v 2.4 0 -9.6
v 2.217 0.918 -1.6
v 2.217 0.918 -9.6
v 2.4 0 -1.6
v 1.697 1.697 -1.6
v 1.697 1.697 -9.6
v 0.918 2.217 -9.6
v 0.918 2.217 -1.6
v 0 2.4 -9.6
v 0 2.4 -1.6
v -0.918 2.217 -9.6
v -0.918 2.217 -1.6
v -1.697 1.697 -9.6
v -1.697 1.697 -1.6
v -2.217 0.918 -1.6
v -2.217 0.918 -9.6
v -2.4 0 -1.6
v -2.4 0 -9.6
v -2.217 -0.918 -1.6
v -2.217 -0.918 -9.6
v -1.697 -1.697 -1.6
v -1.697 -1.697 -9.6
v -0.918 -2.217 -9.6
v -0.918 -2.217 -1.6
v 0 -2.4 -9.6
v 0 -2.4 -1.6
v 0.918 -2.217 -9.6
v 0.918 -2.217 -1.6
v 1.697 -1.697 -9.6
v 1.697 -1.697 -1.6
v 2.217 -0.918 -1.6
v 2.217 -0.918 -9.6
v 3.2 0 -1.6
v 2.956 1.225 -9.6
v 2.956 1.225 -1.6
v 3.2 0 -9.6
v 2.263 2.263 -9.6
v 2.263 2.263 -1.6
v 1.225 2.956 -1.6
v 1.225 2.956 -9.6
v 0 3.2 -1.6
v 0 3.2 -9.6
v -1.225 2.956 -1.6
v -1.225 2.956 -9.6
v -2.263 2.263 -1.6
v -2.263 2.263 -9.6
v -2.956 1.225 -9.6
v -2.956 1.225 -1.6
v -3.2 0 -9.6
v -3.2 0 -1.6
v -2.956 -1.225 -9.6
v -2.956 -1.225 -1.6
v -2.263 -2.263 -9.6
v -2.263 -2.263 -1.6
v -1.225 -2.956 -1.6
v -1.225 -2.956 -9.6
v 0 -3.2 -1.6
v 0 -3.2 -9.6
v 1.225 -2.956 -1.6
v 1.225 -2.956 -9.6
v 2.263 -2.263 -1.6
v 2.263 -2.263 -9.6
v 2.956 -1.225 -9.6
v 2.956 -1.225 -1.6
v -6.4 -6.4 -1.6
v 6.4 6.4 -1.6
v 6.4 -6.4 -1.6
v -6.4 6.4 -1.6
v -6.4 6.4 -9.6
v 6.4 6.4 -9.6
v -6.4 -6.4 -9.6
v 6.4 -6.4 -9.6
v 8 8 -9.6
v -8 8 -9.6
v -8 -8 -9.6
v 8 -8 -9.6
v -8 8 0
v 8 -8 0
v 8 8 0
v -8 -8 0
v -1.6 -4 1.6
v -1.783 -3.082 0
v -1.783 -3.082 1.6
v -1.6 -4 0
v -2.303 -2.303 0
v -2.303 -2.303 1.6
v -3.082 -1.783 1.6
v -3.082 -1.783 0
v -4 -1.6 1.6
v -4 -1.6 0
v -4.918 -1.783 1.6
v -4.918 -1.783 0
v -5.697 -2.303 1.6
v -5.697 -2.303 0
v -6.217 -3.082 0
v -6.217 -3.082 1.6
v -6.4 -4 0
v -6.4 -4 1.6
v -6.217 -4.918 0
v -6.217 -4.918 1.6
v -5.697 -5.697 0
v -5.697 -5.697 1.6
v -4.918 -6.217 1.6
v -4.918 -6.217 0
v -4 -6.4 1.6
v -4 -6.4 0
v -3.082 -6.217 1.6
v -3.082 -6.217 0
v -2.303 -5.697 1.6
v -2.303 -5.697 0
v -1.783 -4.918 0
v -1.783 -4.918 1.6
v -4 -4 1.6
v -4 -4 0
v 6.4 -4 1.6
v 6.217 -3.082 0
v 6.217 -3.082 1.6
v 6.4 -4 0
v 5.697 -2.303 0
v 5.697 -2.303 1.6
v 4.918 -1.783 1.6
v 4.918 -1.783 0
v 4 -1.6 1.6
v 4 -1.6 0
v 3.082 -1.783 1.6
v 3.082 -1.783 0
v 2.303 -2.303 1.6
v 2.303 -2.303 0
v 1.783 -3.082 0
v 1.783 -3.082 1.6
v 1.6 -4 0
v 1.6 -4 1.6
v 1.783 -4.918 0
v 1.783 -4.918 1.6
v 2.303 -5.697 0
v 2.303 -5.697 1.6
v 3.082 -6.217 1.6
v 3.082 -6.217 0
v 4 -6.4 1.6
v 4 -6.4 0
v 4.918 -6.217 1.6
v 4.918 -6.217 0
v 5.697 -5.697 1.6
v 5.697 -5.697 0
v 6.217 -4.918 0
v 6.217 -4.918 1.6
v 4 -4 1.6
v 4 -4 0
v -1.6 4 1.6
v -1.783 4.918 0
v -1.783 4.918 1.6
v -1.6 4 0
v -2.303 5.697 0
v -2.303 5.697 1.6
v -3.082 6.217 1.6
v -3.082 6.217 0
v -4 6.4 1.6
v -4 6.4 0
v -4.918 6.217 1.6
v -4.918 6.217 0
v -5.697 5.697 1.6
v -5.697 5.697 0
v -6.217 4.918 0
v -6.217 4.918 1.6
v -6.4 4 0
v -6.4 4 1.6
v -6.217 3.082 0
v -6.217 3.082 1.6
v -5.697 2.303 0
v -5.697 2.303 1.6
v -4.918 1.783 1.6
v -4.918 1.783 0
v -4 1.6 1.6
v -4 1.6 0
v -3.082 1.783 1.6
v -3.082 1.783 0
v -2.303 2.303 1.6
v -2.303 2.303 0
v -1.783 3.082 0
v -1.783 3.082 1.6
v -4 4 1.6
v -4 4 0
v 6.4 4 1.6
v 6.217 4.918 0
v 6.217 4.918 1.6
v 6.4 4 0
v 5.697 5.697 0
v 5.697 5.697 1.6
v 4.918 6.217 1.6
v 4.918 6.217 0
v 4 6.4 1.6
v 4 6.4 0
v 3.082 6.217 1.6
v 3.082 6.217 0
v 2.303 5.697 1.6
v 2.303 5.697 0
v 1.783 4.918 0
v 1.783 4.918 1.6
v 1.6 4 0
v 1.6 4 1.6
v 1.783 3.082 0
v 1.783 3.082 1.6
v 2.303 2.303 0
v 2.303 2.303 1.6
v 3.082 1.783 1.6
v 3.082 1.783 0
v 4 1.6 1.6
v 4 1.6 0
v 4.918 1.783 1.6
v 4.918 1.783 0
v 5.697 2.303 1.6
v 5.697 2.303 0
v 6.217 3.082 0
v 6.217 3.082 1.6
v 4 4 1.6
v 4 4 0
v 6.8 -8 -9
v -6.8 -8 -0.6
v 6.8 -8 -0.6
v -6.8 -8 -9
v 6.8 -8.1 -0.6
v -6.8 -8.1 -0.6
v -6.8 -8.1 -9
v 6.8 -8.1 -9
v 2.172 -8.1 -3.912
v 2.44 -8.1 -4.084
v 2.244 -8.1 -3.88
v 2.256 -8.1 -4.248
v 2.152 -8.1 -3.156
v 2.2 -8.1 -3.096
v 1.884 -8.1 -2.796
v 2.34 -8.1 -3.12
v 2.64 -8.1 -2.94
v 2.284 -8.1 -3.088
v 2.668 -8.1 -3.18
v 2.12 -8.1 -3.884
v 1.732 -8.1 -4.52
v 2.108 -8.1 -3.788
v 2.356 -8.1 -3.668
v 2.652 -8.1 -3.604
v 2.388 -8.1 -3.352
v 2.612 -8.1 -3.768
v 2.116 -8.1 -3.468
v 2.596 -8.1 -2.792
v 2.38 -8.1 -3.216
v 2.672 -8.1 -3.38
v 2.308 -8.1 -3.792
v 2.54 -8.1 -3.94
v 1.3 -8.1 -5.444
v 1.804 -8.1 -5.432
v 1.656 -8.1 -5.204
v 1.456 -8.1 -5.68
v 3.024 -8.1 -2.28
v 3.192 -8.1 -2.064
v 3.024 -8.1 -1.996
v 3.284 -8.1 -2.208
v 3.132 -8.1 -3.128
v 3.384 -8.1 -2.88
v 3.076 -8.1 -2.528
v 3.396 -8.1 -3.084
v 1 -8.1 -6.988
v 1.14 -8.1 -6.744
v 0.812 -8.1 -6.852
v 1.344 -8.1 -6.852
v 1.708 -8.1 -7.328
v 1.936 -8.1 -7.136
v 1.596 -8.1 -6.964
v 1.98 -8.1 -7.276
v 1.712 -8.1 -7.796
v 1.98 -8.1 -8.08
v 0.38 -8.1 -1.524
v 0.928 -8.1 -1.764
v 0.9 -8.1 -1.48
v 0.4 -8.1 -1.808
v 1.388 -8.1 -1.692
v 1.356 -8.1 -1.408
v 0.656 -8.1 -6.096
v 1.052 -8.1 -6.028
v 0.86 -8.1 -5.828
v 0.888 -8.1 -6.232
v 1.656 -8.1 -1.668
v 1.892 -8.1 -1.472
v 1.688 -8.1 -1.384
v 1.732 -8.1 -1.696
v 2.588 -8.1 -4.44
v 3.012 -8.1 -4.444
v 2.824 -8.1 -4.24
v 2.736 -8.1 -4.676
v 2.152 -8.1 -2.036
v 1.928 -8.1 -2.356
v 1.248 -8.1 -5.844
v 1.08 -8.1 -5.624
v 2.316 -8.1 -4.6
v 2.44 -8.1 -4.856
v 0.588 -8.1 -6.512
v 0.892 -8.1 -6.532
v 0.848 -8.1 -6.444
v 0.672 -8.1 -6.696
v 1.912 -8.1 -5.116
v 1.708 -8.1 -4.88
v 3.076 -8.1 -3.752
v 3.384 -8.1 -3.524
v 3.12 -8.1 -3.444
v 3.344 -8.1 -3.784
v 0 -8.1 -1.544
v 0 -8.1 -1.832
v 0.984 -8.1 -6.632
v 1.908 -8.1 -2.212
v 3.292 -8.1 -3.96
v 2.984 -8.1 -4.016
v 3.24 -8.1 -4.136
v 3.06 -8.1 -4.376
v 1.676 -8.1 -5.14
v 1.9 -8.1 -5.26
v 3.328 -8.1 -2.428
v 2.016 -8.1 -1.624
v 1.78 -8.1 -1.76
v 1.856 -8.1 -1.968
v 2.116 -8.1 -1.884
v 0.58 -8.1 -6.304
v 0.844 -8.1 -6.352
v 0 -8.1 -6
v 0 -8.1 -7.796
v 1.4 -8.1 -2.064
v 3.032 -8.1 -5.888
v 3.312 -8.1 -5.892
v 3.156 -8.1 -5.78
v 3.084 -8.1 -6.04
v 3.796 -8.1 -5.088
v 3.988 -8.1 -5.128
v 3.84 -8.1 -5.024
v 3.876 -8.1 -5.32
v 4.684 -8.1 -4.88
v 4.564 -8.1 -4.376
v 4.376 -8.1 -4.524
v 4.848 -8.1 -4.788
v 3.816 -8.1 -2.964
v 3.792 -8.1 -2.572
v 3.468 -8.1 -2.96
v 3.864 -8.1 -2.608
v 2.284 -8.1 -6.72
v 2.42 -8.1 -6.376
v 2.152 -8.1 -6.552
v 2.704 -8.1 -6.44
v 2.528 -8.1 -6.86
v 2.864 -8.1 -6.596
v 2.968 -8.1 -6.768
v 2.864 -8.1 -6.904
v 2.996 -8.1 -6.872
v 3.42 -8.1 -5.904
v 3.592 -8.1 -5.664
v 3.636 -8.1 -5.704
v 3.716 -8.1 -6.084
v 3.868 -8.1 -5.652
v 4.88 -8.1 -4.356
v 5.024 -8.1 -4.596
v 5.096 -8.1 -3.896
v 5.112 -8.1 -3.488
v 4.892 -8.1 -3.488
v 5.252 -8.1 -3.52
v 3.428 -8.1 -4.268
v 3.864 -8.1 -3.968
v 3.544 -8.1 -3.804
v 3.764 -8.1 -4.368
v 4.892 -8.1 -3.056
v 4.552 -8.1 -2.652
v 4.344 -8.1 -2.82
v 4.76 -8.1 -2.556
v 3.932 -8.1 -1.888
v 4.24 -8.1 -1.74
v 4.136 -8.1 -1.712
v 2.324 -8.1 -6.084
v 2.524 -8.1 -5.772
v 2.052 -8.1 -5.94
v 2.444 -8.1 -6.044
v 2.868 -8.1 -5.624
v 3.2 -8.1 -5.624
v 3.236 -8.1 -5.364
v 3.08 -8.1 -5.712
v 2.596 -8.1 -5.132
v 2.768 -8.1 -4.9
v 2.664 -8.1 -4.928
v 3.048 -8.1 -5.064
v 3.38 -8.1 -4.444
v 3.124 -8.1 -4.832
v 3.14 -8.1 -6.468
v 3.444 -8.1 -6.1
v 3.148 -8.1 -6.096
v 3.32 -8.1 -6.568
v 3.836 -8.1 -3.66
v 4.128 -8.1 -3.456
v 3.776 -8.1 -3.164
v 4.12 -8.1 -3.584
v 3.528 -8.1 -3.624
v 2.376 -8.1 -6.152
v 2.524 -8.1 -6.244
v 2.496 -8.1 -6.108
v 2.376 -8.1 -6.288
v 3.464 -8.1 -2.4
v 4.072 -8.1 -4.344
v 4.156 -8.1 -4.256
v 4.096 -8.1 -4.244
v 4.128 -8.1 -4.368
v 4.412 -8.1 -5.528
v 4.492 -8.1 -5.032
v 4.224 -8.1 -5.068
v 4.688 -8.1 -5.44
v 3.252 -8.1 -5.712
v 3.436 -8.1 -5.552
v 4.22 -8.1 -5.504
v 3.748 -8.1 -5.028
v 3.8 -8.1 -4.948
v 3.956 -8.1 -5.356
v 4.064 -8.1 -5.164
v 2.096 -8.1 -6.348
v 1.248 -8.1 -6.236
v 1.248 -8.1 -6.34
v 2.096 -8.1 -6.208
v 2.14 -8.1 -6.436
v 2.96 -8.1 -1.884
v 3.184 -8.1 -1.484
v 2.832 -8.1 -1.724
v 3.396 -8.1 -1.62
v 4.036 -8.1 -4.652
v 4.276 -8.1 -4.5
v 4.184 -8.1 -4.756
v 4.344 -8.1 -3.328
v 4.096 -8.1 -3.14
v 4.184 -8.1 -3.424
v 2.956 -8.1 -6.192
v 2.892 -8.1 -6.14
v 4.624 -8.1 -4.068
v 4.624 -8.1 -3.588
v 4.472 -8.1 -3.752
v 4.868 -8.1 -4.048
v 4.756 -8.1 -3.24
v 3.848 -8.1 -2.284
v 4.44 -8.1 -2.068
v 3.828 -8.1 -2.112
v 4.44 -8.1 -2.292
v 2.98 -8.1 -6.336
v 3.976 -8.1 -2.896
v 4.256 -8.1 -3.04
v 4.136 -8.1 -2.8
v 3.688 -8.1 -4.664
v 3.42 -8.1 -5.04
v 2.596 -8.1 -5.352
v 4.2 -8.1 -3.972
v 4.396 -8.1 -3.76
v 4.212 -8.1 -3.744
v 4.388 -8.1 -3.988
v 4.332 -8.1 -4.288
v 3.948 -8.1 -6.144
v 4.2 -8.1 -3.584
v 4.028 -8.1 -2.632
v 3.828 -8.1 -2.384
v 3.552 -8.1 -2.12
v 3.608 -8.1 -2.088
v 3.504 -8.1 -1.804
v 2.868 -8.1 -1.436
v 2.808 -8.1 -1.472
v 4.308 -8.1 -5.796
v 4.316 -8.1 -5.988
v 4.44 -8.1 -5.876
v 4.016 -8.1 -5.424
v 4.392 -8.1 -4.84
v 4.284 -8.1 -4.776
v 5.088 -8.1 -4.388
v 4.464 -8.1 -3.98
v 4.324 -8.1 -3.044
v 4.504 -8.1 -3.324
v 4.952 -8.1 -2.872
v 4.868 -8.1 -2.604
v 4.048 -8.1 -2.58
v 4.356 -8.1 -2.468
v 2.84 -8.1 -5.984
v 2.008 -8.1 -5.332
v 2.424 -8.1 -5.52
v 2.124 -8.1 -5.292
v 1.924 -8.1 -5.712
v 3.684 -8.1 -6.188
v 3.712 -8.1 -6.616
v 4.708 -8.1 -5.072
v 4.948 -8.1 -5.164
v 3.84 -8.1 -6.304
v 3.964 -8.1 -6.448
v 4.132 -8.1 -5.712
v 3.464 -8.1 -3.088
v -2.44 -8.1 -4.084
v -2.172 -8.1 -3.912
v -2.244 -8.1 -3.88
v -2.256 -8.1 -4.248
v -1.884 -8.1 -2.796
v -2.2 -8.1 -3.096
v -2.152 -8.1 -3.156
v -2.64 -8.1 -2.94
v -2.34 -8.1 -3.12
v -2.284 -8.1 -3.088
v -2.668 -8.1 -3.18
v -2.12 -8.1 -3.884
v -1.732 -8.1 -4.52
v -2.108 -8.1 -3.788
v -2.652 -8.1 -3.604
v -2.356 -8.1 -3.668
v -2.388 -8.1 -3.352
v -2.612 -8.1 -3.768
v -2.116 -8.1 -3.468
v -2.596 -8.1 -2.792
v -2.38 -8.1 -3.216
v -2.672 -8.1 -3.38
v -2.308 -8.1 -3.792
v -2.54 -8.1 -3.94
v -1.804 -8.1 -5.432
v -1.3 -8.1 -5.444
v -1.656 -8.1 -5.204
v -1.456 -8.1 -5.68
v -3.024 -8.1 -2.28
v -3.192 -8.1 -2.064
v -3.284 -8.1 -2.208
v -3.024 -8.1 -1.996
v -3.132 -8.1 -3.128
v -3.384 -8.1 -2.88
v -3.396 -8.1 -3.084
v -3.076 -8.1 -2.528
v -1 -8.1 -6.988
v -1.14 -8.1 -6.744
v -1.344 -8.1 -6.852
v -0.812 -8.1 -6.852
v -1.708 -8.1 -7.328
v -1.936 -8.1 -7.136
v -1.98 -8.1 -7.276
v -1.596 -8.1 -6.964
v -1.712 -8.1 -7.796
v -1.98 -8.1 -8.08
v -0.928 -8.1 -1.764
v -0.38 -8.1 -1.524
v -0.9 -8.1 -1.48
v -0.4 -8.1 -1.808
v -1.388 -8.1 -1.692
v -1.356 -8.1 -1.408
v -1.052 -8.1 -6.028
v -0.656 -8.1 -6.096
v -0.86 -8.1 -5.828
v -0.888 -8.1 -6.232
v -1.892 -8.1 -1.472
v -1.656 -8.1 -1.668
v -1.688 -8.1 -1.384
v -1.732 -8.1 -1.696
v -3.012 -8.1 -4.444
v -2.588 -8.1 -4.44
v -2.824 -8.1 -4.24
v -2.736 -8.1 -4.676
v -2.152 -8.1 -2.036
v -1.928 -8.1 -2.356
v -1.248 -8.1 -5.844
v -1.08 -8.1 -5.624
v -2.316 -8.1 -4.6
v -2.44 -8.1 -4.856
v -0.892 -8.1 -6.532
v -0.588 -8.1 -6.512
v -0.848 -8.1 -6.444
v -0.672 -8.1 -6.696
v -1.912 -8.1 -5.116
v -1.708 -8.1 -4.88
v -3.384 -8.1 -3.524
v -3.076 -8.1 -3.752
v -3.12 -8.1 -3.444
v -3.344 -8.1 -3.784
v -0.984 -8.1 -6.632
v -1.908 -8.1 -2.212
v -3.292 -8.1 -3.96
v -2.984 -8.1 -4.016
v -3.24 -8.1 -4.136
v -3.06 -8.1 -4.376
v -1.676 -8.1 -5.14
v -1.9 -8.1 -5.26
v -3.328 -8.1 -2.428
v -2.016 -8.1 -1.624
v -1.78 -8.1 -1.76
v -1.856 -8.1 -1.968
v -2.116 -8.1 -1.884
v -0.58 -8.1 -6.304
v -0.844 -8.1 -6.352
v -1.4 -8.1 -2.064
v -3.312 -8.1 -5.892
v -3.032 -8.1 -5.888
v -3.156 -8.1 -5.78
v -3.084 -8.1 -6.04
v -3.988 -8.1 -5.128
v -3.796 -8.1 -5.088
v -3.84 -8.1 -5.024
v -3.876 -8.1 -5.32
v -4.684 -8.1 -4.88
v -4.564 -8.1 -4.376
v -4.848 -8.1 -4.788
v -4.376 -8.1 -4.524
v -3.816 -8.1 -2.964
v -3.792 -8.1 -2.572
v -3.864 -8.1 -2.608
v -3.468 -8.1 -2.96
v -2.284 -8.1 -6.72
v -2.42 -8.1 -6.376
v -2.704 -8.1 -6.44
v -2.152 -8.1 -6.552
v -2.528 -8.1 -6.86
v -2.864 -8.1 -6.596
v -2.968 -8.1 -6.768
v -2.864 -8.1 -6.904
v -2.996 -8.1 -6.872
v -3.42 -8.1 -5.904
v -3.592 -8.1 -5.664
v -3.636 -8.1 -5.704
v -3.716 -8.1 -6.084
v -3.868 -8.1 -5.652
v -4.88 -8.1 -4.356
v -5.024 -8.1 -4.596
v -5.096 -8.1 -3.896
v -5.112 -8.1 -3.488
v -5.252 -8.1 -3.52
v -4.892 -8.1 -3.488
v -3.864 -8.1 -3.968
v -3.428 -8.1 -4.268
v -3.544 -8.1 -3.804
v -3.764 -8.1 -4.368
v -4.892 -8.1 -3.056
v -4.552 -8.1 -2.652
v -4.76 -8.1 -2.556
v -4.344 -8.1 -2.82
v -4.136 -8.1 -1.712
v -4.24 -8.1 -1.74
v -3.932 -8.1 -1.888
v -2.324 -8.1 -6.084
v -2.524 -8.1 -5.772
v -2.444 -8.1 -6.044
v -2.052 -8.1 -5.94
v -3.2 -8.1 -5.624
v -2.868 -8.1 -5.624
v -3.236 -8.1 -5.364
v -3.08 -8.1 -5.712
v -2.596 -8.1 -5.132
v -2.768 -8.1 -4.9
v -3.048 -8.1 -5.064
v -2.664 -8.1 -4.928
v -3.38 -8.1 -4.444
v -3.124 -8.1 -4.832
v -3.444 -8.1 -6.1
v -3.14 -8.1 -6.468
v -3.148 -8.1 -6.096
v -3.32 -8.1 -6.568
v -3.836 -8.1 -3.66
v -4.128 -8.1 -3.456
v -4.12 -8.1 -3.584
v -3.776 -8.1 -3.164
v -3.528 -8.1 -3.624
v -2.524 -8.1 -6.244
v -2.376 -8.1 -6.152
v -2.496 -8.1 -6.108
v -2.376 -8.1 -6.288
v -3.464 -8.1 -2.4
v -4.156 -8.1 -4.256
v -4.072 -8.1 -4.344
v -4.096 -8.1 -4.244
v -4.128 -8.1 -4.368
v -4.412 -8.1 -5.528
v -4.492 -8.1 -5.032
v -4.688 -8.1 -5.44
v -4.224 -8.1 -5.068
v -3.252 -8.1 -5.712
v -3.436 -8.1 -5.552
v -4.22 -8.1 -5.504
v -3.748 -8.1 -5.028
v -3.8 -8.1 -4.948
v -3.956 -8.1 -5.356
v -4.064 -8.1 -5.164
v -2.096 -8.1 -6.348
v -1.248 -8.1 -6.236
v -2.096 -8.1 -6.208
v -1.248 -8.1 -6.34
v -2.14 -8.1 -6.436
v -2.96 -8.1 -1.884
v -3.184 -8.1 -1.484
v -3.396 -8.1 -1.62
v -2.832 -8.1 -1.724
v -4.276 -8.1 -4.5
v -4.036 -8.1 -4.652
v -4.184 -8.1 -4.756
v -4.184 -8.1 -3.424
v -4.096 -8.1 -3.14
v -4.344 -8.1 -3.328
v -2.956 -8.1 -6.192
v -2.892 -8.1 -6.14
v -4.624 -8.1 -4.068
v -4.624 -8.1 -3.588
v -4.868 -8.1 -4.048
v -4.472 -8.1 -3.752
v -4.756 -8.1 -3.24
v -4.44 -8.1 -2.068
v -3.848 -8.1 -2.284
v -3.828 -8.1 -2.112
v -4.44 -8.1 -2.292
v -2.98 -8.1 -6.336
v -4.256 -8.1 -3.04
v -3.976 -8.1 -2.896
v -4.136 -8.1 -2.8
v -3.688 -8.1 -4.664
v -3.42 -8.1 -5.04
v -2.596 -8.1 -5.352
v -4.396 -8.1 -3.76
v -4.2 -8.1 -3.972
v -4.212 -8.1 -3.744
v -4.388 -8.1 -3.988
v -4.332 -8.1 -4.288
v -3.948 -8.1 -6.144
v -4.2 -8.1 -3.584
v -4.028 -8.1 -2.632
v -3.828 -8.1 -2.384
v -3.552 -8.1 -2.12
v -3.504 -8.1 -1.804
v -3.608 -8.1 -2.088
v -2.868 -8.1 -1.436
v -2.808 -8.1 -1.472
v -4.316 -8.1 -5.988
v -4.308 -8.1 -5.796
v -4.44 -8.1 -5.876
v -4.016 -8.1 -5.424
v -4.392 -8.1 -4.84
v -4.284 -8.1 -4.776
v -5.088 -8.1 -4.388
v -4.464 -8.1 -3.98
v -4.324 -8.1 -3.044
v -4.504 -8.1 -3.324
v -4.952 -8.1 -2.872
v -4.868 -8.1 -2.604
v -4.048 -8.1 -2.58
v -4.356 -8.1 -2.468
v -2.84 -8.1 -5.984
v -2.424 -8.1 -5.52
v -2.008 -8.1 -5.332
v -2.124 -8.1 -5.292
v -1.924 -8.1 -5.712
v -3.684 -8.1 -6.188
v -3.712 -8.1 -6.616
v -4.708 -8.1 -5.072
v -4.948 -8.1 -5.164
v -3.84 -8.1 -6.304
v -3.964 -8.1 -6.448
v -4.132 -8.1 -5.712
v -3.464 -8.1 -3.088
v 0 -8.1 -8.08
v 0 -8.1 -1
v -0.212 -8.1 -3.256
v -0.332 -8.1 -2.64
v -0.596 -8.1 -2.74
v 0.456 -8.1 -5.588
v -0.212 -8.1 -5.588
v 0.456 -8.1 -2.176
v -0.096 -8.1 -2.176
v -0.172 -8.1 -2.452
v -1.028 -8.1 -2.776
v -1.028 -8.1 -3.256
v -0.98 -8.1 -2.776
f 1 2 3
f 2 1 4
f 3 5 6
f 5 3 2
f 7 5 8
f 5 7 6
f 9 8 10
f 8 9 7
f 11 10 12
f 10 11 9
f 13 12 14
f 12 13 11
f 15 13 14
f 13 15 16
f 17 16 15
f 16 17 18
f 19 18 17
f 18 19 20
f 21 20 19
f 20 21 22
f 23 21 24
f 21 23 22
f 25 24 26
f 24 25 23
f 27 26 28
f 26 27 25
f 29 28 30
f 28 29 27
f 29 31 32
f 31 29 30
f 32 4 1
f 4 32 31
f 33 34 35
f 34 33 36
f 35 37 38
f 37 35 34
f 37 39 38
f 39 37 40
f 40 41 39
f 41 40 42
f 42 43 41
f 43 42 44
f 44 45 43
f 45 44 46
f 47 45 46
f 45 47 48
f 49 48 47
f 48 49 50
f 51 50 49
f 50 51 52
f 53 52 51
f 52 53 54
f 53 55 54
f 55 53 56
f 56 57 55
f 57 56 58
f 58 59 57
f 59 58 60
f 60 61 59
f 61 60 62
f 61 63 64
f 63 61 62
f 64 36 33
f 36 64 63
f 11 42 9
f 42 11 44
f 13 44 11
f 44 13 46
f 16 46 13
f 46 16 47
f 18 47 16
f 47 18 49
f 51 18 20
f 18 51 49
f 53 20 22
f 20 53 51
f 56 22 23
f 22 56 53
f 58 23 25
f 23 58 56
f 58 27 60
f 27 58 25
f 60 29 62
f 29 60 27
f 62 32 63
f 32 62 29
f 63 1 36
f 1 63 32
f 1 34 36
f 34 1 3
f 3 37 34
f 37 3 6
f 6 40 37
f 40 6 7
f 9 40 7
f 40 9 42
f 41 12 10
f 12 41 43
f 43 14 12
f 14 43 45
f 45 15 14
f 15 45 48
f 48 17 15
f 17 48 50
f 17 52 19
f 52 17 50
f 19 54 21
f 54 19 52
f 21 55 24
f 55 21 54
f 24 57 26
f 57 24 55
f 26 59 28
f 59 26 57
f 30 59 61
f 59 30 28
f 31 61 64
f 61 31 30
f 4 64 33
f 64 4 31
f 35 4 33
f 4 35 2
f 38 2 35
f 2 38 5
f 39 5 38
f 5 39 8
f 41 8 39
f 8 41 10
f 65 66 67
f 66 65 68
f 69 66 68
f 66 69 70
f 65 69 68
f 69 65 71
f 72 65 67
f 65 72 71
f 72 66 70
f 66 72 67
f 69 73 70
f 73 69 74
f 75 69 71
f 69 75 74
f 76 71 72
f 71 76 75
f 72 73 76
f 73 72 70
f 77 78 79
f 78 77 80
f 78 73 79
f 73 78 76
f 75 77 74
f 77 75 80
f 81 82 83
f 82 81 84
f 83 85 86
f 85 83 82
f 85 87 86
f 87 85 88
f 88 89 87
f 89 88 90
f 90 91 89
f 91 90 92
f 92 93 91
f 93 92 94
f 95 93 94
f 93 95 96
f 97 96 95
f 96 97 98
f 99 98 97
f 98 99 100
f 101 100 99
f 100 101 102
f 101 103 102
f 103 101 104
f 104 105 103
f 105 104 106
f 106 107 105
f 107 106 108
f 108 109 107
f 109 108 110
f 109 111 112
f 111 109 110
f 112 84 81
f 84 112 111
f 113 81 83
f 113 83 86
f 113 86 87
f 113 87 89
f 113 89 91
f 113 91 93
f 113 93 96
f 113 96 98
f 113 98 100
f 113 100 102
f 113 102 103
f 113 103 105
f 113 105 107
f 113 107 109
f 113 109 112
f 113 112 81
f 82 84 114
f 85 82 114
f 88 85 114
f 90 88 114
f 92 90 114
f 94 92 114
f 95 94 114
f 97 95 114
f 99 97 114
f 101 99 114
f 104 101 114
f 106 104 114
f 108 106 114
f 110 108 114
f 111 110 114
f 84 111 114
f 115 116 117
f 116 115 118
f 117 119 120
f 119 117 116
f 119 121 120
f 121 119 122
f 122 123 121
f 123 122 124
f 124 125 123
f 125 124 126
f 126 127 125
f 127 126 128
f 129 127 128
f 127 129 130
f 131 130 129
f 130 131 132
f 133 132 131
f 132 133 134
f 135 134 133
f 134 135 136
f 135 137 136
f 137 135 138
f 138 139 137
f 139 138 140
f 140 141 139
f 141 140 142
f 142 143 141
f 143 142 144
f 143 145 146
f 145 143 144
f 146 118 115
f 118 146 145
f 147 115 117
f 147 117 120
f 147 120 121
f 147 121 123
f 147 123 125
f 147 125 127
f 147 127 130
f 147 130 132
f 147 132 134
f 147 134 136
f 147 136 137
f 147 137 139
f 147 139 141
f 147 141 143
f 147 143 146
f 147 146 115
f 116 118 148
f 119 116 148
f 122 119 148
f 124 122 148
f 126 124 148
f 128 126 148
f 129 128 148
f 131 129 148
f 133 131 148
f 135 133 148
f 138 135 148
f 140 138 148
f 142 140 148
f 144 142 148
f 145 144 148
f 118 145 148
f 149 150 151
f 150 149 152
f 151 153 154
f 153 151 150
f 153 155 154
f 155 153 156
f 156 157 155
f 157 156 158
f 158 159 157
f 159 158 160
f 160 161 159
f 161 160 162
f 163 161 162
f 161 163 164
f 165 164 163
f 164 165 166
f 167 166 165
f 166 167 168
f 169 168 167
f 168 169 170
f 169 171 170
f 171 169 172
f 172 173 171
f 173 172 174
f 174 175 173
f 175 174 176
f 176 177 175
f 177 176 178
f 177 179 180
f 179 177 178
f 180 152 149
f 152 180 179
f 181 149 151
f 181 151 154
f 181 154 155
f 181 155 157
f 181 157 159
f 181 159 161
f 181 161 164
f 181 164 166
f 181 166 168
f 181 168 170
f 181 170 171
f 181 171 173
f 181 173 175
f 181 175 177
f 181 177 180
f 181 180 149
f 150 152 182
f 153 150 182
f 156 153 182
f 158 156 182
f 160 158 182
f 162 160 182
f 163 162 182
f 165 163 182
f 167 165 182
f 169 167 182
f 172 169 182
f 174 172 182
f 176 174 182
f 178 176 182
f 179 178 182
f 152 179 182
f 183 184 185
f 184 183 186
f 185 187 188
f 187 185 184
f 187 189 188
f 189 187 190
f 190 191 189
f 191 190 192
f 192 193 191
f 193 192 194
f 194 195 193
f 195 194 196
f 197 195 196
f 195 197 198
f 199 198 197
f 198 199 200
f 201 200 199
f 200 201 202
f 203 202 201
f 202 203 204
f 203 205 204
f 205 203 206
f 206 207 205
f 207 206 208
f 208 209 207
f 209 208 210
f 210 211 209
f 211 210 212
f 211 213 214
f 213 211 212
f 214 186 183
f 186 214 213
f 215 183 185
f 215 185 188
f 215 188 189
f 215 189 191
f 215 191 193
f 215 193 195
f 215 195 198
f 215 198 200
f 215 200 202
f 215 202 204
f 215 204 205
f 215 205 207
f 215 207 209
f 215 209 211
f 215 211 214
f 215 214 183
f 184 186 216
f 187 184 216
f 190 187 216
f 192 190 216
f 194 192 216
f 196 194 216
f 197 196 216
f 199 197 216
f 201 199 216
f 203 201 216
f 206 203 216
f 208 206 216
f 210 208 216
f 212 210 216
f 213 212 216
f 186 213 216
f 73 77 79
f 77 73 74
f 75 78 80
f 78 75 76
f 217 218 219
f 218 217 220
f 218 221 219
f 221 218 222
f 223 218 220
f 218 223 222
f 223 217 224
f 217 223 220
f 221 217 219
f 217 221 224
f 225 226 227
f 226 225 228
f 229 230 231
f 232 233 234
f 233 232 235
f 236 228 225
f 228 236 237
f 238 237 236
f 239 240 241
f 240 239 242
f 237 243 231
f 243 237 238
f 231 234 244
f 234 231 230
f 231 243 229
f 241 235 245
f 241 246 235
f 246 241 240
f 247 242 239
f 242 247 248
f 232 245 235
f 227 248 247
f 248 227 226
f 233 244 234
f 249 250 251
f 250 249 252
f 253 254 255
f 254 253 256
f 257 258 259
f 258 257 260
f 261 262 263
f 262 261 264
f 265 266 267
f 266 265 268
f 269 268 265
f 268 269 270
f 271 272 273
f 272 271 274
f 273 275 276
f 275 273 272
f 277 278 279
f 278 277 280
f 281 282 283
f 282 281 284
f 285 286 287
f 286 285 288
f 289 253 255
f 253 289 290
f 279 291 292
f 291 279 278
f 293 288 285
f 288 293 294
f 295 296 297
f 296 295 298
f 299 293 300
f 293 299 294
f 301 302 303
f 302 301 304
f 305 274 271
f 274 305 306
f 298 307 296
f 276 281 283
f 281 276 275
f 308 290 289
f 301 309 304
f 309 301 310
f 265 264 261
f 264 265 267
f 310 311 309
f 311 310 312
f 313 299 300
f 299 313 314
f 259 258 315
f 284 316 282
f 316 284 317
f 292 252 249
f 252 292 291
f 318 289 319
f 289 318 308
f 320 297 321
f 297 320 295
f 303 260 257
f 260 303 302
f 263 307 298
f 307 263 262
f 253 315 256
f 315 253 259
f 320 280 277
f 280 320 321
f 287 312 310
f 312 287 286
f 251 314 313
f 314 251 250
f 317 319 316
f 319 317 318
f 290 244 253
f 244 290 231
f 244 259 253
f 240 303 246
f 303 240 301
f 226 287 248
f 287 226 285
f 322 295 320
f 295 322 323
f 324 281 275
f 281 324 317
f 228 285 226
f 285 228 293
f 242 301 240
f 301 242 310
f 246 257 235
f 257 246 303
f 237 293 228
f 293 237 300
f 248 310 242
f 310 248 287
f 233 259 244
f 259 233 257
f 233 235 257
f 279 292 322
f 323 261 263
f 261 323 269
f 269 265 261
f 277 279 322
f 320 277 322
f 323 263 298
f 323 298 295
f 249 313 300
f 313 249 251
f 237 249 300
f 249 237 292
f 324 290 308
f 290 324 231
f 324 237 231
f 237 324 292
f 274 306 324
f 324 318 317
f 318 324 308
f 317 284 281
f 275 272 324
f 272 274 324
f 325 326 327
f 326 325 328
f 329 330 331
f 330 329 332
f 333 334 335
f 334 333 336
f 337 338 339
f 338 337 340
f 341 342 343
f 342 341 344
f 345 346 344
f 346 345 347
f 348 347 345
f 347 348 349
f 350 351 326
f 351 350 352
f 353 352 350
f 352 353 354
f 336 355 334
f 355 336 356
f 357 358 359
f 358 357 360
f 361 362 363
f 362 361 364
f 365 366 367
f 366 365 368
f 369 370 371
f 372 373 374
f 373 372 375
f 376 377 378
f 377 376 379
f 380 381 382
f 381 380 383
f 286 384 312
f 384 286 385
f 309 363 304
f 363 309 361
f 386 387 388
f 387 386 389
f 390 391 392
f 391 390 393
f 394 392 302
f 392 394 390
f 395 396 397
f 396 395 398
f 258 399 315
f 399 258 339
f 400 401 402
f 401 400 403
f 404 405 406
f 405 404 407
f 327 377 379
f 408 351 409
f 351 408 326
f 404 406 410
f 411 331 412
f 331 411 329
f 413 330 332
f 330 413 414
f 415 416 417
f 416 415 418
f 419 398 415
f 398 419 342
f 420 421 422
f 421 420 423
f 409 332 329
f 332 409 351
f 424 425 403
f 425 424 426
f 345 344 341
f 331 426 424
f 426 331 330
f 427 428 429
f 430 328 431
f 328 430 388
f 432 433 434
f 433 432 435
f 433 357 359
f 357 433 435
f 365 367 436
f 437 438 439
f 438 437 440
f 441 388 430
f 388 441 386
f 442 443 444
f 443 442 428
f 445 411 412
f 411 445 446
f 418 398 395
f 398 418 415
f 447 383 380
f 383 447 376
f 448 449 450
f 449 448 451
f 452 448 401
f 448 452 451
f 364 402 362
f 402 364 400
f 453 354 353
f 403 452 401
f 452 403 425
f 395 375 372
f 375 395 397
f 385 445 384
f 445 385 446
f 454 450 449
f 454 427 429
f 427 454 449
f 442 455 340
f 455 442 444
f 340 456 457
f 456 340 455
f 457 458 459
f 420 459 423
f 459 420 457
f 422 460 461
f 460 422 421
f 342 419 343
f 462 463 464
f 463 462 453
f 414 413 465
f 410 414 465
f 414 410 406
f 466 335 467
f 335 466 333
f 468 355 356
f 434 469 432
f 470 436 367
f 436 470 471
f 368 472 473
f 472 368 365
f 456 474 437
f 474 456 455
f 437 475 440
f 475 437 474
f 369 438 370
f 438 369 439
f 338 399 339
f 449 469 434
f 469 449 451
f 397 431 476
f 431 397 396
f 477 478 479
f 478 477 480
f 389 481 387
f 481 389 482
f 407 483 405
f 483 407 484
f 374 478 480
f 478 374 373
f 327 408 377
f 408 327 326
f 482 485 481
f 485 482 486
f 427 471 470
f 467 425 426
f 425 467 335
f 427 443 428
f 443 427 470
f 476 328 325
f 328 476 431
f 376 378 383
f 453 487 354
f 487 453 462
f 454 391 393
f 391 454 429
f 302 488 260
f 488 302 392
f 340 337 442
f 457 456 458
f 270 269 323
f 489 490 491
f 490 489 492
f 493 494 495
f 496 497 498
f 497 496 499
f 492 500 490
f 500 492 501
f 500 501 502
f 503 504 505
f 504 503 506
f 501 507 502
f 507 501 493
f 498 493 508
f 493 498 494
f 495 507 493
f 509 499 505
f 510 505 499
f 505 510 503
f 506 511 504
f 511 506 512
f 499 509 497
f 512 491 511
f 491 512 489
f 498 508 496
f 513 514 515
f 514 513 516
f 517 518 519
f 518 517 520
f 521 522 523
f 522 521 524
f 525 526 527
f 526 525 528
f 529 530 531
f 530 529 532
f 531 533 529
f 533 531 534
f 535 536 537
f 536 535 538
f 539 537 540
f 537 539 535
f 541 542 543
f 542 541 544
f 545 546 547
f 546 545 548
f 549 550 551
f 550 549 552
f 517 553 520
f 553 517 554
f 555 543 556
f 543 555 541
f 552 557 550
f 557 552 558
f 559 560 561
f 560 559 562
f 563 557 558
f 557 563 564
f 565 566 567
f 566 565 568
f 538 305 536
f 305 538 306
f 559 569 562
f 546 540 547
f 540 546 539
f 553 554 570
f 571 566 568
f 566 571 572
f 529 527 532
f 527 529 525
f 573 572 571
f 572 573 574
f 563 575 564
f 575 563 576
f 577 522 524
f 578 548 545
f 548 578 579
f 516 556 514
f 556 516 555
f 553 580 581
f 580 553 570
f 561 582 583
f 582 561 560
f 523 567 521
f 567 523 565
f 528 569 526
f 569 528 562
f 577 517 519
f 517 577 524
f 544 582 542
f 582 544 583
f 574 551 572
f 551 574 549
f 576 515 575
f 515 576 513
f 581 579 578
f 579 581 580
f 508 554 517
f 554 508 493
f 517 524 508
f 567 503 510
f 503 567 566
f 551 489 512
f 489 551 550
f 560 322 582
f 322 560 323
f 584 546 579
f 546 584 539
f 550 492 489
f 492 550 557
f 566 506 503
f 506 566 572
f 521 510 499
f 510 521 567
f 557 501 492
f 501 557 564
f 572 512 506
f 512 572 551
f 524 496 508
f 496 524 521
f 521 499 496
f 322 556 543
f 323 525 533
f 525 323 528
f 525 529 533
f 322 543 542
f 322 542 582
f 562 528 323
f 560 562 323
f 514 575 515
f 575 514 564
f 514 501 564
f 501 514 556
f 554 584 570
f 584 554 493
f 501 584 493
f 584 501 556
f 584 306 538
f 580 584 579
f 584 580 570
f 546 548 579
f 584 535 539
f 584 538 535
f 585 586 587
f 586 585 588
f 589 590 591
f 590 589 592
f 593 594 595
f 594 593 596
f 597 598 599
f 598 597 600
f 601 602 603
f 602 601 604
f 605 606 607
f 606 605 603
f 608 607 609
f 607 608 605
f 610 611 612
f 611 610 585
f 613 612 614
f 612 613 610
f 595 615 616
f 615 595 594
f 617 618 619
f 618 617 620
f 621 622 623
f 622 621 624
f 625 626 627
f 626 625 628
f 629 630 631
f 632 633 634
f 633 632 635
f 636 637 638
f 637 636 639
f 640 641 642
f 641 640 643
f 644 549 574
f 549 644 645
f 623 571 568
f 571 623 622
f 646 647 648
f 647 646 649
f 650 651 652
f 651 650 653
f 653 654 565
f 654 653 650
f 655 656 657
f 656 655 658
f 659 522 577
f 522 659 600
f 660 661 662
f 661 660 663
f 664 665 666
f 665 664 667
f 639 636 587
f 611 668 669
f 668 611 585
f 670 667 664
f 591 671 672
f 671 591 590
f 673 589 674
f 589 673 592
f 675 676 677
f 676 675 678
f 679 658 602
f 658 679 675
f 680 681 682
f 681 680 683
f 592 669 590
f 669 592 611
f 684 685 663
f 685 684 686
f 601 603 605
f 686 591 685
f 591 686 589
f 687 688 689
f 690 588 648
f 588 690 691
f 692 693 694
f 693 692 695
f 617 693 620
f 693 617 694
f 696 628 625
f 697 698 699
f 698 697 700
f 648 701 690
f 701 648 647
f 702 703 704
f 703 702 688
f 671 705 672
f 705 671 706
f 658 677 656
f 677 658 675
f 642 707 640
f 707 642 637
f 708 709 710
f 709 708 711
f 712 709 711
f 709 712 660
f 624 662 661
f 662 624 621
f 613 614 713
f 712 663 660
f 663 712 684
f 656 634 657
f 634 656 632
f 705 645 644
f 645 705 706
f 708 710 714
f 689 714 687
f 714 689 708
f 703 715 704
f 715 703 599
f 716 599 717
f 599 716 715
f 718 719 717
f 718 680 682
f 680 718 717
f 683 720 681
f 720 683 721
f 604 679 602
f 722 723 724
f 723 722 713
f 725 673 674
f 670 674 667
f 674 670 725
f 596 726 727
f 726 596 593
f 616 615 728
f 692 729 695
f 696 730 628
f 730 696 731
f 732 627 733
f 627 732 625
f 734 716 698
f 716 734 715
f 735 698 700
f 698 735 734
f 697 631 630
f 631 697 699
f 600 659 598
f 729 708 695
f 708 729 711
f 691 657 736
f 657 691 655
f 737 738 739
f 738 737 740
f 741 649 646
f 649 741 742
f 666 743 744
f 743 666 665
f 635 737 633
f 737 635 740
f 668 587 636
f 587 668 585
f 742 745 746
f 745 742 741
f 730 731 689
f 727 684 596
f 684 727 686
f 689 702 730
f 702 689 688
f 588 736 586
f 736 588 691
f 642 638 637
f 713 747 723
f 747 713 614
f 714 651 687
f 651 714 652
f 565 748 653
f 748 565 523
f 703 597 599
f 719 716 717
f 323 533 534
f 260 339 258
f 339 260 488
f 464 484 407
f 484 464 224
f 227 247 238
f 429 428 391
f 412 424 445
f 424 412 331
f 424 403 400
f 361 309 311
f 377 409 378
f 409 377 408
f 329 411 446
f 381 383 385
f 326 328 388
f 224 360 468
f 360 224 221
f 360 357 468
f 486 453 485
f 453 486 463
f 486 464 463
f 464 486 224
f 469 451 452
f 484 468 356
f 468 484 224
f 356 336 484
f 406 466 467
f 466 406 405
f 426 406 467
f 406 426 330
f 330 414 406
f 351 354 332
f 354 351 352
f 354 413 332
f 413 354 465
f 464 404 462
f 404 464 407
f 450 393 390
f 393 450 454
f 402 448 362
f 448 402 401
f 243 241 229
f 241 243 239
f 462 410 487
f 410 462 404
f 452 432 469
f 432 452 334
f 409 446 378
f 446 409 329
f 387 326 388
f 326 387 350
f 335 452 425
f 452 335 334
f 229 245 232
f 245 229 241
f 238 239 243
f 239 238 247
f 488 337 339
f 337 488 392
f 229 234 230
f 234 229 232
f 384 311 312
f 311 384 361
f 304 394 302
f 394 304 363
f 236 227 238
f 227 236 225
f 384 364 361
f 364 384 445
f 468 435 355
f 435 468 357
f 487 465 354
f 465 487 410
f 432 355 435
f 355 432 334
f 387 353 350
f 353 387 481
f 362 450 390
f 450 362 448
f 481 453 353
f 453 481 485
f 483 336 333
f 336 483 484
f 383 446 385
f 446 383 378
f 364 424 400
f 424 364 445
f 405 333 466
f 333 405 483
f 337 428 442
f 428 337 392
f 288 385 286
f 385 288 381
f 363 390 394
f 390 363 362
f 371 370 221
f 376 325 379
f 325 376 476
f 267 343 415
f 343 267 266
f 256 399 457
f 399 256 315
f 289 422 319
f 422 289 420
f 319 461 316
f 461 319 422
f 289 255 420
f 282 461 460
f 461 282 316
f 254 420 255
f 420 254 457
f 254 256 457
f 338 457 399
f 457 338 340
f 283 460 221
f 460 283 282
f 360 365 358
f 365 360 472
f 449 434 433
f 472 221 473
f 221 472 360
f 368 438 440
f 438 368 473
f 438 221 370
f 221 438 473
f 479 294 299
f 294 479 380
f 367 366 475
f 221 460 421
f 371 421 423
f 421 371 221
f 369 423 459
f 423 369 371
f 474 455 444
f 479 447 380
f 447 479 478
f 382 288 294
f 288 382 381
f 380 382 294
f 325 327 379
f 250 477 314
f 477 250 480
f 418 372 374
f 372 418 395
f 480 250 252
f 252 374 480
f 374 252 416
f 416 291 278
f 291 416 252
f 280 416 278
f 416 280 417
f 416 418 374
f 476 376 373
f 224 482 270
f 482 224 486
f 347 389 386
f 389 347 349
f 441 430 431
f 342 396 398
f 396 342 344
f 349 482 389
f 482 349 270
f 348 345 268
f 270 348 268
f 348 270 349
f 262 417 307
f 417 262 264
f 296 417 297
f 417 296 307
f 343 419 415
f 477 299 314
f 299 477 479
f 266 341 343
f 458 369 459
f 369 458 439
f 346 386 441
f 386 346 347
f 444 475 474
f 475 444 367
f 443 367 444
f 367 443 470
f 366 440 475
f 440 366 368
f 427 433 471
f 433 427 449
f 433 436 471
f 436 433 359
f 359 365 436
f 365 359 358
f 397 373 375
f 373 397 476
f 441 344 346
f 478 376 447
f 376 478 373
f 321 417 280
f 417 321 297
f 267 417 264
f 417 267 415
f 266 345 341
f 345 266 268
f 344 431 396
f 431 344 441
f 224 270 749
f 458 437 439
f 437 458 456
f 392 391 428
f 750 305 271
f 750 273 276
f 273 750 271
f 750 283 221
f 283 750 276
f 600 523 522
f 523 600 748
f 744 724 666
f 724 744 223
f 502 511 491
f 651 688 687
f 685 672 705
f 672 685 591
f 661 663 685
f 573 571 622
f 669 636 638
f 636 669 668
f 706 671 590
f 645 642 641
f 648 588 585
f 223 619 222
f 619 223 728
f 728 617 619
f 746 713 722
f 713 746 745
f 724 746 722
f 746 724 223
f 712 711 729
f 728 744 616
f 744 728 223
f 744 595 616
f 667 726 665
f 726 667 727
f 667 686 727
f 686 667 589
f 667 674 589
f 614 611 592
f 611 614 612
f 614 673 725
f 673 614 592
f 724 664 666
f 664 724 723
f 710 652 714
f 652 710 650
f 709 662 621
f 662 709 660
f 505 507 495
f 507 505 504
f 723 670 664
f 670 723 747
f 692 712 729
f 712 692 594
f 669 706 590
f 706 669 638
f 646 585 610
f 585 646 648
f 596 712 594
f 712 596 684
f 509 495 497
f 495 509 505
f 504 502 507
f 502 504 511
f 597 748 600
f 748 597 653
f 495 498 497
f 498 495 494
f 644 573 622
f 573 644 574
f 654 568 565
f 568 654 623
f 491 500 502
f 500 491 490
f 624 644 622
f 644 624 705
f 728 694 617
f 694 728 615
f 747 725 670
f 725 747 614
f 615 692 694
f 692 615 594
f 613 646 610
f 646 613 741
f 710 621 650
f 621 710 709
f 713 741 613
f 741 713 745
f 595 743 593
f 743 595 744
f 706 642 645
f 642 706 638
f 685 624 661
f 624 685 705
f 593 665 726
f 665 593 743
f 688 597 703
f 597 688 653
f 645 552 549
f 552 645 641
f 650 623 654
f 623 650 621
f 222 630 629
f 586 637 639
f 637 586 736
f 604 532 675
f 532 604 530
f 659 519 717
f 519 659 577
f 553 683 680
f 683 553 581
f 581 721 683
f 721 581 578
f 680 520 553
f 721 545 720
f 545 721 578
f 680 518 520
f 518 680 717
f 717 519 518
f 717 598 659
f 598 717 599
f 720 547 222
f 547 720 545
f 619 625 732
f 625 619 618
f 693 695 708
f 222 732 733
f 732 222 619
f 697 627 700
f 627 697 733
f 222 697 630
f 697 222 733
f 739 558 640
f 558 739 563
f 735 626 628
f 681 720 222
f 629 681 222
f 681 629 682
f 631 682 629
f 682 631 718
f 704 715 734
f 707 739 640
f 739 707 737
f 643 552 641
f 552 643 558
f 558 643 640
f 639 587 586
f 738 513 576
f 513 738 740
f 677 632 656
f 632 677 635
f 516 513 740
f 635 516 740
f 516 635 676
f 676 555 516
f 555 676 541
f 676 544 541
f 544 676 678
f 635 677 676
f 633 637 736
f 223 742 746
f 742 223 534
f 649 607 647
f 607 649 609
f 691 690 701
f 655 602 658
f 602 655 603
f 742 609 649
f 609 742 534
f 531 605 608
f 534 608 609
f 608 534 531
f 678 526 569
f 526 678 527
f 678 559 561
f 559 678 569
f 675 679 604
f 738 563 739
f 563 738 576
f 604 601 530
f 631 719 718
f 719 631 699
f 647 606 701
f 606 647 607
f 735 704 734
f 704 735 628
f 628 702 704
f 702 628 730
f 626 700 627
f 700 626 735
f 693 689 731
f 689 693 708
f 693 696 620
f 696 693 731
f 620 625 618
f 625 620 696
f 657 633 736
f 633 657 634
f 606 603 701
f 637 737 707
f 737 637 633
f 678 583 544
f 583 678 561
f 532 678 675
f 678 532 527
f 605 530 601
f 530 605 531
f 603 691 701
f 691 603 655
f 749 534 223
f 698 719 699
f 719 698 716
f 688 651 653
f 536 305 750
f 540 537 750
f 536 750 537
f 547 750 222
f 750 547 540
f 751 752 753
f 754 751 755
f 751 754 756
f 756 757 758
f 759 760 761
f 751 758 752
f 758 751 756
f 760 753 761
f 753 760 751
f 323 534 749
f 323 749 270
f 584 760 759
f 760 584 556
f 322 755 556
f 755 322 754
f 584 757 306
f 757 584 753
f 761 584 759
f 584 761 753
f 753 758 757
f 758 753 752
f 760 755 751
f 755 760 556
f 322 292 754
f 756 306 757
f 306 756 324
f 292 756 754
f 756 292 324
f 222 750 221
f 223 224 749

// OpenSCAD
use <../lib.scad>
use <170877b.scad>
use <3003.scad>
function ldraw_lib__3003d07() = [
// 0 Brick  2 x  2 with 1st Place Cup and Laurels Sticker
// 0 Name: 3003d07.dat
// 0 Author: Takeshi Takahashi [RainbowDolphin]
// 0 !LDRAW_ORG Shortcut UPDATE 2025-11
// 0 !LICENSE Licensed under CC BY 4.0 : see CAreadme.txt
// 
// 0 BFC CERTIFY CCW
  [0,"BFC","CERTIFY"],
  [0,"BFC","CCW"],
// 
// 0 !CATEGORY Sticker Shortcut
// 
// 0 !KEYWORDS Bricklink 3003pb115, Fast Track Finish, set 6337
// 
// 0 !HISTORY 2025-11-30 [OrionP] Official Update 2025-11
// 
// 1 16 0 0 0 1 0 0 0 1 0 0 0 1 3003.dat
  [1,16,0,0,0,1,0,0,0,1,0,0,0,1, ldraw_lib__3003()],
// 1 16 0 12 -20 1 0 0 0 0 -1 0 1 0 170877b.dat
  [1,16,0,12,-20,1,0,0,0,0,-1,0,1,0, ldraw_lib__170877b()],
];
module ldraw_lib__3003d07(step=0, col=false, unit=2/5, alt=false, line=0.2, solid=!$preview)
    makepoly(ldraw_lib__3003d07(), step=step, col=col, unit=unit, alt=alt, line=line, solid=solid);
ldraw_lib__3003d07(line=0.2);
